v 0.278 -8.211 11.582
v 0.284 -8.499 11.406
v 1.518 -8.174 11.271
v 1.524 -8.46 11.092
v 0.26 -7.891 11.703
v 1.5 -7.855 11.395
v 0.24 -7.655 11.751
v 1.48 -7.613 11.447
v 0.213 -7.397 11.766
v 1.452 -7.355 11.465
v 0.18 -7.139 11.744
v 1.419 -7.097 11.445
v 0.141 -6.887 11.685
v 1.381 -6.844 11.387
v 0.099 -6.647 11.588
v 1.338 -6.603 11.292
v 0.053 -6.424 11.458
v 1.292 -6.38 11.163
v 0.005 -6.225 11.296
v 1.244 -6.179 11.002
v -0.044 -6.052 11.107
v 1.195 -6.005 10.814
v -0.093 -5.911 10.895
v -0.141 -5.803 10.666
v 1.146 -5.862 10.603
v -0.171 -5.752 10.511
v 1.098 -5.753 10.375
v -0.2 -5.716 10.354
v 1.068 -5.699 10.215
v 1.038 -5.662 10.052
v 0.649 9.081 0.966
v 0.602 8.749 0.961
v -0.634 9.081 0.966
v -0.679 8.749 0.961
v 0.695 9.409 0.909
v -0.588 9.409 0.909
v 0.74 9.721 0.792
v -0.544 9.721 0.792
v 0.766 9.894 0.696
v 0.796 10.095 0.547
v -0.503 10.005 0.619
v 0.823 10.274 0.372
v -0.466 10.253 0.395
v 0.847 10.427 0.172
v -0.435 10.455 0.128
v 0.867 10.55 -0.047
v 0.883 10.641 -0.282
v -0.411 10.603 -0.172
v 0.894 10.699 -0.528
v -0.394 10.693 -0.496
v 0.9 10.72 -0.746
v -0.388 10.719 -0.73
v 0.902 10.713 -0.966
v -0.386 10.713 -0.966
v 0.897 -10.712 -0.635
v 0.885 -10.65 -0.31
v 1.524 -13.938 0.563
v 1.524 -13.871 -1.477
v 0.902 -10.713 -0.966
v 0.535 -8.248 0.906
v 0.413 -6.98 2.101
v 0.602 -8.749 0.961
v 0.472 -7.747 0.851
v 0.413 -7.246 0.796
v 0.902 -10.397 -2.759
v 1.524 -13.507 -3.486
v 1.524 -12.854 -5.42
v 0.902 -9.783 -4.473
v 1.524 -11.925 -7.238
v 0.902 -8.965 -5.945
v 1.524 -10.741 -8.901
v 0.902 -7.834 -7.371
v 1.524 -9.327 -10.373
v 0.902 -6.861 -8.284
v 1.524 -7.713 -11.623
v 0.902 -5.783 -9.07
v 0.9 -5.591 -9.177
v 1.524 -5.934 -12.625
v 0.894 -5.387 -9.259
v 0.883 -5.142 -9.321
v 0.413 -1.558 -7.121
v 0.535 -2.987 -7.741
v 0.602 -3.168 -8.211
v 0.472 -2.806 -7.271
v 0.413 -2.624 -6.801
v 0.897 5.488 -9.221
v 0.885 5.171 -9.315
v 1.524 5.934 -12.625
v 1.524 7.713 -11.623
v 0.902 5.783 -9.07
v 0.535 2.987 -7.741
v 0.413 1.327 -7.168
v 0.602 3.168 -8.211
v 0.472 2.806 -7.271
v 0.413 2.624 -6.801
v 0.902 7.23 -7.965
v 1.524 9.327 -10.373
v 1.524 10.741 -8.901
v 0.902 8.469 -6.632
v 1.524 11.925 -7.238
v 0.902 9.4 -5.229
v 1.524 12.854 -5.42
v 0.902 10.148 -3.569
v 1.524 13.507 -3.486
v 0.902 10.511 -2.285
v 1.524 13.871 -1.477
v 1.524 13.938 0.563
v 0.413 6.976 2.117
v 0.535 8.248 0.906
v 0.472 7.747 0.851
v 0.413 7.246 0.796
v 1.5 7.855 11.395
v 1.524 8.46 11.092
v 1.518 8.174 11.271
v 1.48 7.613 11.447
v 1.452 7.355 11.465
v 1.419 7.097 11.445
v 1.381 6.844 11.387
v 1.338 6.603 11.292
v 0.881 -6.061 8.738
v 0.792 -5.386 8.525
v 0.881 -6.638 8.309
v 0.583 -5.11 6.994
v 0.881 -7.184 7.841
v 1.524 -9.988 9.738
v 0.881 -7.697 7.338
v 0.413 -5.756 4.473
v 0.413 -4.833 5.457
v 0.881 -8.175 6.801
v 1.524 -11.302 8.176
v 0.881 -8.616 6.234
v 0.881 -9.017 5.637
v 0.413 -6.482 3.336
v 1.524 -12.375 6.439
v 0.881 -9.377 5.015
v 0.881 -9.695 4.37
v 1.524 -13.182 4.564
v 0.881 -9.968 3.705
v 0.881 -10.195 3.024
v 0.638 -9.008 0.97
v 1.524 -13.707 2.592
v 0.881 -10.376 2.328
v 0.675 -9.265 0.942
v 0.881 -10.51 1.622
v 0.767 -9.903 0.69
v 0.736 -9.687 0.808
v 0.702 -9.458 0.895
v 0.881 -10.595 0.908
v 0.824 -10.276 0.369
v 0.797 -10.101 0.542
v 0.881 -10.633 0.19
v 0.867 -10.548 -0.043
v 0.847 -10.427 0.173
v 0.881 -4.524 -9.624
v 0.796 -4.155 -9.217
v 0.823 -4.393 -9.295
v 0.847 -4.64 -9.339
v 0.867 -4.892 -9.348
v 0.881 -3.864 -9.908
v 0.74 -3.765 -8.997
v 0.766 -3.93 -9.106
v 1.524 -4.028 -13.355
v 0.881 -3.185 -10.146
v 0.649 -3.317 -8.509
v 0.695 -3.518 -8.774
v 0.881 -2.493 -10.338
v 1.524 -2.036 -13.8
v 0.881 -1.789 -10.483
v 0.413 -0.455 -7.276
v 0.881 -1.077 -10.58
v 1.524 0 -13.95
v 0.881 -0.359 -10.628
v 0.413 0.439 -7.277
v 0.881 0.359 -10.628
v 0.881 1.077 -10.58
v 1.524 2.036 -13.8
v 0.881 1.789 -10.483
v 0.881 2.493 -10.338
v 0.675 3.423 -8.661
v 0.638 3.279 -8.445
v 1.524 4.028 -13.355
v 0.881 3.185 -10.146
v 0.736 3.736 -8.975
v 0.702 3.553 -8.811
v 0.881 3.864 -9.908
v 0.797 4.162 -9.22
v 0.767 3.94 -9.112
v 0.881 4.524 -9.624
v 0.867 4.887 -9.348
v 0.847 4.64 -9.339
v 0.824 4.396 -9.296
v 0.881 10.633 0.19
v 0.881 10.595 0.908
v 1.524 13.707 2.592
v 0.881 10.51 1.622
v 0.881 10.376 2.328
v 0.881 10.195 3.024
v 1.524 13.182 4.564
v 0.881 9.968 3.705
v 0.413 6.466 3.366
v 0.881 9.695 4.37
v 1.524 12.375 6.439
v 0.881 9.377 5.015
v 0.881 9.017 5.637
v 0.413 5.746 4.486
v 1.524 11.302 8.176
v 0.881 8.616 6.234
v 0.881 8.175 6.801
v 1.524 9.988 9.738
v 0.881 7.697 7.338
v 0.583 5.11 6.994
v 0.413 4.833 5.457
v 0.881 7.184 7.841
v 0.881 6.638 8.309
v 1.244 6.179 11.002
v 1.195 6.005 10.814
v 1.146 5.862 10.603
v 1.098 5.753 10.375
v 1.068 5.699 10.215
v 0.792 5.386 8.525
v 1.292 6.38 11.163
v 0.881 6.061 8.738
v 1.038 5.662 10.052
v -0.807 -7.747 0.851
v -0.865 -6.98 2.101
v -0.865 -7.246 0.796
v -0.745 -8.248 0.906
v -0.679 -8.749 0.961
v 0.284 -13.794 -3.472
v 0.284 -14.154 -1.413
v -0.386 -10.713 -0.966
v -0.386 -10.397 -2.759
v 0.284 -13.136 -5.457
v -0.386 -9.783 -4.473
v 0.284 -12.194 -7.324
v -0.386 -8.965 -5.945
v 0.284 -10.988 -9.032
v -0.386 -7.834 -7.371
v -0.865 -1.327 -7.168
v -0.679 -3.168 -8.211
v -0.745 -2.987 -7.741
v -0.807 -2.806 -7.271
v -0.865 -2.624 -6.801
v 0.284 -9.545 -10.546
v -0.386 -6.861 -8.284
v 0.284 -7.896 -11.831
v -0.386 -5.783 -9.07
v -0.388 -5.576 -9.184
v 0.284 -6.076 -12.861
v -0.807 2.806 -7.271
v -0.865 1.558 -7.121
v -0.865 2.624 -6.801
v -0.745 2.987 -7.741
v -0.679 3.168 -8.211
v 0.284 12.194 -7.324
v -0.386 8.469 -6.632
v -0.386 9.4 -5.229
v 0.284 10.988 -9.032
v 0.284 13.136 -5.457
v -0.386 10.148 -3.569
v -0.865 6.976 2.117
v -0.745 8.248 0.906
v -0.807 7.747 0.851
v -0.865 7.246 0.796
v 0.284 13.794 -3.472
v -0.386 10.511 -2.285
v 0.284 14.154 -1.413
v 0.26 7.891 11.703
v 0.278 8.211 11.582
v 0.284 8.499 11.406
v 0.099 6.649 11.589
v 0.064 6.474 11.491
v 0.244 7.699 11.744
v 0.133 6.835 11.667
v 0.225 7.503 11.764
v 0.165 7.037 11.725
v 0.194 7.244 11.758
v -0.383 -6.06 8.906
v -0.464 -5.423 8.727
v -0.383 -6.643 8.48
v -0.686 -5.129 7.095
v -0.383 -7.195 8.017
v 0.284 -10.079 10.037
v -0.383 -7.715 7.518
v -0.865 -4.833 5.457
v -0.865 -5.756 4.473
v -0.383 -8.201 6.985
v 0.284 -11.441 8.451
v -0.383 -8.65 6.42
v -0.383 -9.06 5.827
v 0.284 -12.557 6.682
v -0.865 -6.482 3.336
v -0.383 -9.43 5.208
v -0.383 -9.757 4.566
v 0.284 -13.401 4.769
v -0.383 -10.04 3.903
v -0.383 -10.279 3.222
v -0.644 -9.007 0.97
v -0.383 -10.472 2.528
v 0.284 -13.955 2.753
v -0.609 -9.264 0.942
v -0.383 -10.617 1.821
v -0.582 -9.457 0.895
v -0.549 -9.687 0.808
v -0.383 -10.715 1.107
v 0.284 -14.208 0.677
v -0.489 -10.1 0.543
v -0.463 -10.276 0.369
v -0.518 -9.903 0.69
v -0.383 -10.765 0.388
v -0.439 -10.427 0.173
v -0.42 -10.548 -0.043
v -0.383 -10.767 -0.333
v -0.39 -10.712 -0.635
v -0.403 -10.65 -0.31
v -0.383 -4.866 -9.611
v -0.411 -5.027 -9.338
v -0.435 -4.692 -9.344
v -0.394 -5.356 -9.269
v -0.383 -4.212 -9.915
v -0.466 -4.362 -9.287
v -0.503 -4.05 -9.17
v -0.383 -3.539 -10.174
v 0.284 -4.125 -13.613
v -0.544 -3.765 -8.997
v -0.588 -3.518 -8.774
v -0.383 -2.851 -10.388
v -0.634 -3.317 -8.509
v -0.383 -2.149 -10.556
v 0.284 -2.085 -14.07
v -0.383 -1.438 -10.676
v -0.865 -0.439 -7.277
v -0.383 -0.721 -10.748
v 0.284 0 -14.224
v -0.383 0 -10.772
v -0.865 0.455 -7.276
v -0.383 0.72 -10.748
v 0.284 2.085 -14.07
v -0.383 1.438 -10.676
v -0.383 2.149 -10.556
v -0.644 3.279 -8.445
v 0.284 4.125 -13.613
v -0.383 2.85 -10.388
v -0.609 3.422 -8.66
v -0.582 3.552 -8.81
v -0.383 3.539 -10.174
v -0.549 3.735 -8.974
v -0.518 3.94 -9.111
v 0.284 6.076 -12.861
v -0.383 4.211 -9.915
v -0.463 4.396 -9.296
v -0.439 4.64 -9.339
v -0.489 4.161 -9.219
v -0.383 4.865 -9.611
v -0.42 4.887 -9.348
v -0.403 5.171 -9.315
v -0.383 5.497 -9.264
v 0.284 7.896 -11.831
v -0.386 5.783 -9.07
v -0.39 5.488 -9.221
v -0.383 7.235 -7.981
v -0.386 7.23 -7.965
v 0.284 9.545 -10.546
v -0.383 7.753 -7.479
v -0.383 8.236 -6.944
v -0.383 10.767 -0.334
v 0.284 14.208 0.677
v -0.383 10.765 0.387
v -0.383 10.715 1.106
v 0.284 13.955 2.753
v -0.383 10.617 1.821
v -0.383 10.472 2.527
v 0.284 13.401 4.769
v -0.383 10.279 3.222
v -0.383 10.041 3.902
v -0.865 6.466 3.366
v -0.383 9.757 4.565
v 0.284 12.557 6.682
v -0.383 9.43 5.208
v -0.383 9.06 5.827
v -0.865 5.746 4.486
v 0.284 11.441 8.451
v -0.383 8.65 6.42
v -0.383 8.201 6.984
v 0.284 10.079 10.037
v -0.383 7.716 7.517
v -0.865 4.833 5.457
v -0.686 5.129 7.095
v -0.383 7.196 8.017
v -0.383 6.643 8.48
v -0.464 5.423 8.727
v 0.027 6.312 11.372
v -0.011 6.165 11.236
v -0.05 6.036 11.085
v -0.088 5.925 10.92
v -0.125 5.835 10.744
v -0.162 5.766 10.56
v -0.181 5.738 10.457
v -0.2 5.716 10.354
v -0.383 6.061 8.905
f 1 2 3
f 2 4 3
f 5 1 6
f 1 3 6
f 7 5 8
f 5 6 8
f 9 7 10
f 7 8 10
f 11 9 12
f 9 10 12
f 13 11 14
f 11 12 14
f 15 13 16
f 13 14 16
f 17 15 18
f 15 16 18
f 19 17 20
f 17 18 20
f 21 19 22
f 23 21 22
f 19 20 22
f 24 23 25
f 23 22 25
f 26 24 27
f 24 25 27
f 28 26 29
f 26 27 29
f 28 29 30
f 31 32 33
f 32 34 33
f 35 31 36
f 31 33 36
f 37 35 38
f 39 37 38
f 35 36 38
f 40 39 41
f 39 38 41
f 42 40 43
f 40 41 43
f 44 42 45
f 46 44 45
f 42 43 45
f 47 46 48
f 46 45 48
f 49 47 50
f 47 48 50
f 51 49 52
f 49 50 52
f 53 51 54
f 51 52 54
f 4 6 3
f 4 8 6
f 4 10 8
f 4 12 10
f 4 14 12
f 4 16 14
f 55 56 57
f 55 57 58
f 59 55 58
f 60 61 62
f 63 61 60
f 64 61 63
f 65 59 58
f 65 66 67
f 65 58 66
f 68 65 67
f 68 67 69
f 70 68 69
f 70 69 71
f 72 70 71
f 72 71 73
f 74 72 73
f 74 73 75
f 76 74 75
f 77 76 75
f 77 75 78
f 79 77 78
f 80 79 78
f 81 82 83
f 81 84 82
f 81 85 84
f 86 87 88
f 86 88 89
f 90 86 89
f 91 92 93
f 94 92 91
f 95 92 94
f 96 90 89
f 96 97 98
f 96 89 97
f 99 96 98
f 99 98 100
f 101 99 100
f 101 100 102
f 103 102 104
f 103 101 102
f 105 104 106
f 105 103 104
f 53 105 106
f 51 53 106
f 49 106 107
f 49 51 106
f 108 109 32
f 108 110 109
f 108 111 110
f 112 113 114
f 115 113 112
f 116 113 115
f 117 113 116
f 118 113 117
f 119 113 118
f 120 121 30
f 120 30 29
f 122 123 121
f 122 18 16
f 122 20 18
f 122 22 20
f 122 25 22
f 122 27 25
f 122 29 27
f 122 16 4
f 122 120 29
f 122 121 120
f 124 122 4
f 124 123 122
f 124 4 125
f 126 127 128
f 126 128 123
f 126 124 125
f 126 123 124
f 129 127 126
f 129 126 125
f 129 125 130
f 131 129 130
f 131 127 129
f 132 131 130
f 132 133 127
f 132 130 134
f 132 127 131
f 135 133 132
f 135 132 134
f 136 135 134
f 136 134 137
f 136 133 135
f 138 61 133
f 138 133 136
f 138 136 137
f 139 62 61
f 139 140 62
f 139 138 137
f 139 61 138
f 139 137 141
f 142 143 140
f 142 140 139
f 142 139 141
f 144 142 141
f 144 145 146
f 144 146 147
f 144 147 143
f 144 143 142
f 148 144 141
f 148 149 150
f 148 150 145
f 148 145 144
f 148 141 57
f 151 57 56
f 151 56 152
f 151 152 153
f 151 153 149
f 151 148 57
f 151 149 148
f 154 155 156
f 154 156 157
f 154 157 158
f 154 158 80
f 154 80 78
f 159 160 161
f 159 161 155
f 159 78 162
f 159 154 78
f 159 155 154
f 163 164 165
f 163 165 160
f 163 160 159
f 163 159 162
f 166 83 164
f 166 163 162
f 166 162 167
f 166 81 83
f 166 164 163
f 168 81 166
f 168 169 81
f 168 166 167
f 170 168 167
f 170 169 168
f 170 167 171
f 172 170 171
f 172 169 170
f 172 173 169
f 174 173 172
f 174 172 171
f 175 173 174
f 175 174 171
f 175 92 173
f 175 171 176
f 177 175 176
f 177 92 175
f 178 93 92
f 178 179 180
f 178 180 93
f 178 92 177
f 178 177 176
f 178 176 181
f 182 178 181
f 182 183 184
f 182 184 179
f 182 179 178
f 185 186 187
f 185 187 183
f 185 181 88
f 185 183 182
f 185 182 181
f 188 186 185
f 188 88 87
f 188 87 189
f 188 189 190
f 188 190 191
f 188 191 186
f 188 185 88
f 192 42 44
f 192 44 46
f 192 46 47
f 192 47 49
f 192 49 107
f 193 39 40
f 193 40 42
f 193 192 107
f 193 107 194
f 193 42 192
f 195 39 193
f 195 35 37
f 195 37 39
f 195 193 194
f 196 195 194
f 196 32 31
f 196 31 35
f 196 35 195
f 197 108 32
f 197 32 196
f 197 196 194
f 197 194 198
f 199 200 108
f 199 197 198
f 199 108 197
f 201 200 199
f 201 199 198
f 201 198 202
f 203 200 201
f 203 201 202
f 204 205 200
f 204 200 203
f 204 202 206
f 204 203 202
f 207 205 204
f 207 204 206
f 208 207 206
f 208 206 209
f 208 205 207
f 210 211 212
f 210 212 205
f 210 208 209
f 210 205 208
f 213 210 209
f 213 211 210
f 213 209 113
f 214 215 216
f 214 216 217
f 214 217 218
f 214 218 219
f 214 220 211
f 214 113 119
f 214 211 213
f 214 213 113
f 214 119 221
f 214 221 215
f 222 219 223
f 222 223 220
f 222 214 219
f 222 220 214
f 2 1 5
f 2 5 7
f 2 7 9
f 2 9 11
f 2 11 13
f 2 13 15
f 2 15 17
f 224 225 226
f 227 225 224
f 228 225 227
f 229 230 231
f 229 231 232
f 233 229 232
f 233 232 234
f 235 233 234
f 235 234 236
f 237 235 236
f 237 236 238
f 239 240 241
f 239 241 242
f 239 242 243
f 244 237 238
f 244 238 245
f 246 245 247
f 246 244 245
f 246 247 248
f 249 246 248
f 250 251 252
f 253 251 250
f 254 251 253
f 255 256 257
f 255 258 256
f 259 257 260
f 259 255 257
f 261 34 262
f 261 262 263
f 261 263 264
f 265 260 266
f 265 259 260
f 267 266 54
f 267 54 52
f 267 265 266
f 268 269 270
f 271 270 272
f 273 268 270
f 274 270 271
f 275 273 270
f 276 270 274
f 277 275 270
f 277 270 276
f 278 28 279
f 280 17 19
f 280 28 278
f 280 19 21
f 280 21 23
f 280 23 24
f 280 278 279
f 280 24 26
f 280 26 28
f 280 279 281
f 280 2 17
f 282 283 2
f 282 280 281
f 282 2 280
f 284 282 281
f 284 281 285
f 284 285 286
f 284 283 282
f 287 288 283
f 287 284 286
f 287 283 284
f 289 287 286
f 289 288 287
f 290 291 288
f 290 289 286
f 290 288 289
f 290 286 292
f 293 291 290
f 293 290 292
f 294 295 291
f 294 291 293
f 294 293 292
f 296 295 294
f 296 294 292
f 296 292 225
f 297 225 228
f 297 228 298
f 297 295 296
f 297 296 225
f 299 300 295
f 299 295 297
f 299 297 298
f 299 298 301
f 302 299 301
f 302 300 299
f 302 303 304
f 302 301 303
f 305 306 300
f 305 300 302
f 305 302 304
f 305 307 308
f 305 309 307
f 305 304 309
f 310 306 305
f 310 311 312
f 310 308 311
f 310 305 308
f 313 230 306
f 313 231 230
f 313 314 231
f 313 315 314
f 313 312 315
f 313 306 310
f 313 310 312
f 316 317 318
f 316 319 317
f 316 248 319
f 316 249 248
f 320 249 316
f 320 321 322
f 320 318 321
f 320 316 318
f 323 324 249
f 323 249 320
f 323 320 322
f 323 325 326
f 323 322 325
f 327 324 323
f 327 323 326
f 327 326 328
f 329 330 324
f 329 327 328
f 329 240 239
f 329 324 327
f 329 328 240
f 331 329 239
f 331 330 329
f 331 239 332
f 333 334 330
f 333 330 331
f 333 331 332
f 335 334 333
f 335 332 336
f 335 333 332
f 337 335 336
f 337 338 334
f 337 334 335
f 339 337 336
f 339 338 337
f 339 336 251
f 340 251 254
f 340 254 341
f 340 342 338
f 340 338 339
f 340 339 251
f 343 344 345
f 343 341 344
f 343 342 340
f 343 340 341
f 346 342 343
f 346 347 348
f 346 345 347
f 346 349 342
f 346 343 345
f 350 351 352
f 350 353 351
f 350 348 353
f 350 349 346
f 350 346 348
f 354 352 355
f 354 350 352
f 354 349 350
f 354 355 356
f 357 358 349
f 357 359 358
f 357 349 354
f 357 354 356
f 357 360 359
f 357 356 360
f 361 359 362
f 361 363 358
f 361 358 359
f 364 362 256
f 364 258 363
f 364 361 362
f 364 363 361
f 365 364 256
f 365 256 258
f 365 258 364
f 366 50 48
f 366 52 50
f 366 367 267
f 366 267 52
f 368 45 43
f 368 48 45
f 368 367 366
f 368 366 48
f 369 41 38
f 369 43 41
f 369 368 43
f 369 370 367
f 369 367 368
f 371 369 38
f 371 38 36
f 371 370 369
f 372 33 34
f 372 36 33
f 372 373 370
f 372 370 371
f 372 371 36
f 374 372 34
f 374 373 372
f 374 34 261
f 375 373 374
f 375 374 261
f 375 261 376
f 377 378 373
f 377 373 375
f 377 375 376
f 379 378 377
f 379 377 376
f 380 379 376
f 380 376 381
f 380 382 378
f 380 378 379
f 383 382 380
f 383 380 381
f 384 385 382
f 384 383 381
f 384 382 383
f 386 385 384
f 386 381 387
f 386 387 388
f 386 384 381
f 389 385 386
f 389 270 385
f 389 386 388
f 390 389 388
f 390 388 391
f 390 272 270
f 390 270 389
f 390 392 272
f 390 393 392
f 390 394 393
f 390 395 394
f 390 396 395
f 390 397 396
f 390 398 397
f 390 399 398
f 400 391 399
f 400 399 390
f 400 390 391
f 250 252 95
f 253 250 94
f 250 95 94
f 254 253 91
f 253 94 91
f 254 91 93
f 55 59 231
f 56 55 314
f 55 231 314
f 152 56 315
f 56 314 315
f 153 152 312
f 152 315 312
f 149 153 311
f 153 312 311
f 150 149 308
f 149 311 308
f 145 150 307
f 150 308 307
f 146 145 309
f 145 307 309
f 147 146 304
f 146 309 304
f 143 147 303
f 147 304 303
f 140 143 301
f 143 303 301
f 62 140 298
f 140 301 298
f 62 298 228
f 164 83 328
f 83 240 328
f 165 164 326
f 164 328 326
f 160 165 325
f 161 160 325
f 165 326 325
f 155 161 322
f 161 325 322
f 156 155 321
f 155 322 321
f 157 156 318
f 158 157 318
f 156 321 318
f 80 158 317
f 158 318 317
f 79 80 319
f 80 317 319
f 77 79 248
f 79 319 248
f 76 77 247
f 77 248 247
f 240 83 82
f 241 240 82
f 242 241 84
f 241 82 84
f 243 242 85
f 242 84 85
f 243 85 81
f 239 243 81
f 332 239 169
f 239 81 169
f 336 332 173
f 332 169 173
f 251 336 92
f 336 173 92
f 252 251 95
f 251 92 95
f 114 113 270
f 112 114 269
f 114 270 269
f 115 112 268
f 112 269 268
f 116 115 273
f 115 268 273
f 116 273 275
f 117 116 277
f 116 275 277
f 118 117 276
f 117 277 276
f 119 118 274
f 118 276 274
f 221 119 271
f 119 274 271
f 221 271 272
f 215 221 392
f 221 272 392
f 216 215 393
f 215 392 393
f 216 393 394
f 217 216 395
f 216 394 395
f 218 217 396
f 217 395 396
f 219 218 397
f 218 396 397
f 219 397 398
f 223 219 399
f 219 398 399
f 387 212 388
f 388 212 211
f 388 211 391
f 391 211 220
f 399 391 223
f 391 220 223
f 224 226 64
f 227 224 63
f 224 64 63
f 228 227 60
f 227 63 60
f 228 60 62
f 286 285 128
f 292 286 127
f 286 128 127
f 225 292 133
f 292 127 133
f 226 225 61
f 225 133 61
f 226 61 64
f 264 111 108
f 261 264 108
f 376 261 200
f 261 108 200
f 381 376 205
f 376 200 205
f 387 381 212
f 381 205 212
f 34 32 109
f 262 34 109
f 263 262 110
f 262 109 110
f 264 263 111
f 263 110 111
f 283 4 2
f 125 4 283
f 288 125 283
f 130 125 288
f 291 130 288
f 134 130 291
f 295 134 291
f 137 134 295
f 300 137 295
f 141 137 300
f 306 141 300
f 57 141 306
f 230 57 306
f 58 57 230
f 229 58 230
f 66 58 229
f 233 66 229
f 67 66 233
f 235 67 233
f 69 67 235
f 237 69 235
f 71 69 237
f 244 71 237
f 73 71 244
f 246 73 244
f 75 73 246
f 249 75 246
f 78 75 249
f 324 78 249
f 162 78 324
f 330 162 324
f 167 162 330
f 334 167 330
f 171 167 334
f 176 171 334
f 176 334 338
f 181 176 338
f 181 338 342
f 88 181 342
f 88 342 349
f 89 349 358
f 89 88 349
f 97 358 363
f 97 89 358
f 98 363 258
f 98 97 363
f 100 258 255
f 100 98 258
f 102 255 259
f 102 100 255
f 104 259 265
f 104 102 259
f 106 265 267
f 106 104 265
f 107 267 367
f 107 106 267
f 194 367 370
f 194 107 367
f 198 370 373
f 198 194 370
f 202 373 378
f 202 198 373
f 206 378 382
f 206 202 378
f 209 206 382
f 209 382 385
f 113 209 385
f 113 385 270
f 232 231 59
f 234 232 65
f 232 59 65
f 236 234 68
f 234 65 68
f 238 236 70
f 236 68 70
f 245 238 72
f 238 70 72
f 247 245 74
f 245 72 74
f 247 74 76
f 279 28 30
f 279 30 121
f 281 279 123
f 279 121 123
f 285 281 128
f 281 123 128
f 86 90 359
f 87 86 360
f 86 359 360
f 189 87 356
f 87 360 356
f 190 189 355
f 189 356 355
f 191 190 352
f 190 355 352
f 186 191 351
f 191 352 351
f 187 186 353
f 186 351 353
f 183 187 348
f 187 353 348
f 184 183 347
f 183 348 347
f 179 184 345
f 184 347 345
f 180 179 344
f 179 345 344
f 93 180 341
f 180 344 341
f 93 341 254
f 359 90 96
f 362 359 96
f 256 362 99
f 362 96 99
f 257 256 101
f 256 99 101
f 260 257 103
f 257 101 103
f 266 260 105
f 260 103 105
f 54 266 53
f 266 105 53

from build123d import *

# Parameters (mm, degrees)
CUT_EXTRUDE1_DEPTH = 3.794
FILLET1_R          = 1.778


with BuildPart() as part:
    # Sketch2 → Revolve1 (revolve)
    with BuildSketch(Plane(origin=(0, 0, 0), x_dir=(1, 0, 0), z_dir=(0, 1, 0))):
        with BuildLine():
            Line((0.283958229, 14.224), (1.524, 13.949780367))
            ThreePointArc((1.524, 13.949780367), (0.382130108, 7.016390601), (0, 0))
            Line((0, 0), (-1.27, 0))
            ThreePointArc((-1.27, 0), (-0.880358119, 7.154316218), (0.283958229, 14.224))
        make_face()
    revolve(axis=Axis((0, 0, 0), (1, 0, 0)))

    # Sketch1 → Cut-Extrude1 (cut, through all)
    with BuildSketch(Plane(origin=(1.524, 0, 0), x_dir=(0, 0, -1), z_dir=(1, 0, 0))):
        with BuildLine():
            Line((-12.820693103, -6.160519812), (-5.457008659, -4.833450169))
            ThreePointArc((-5.457008659, -4.833450169), (-3.351086736, -6.473901585), (-0.795799518, -7.246232619))
            Line((-0.795799518, -7.246232619), (-1.174289533, -10.692611547))
            ThreePointArc((-1.174289533, -10.692611547), (5.59102597, -9.189740269), (10.03567463, -3.872484))
            Line((10.03567463, -3.872484), (6.8010357, -2.624328))
            ThreePointArc((6.8010357, -2.624328), (7.2898, 0), (6.8010357, 2.624328))
            Line((6.8010357, 2.624328), (10.03567463, 3.872484))
            ThreePointArc((10.03567463, 3.872484), (5.59102597, 9.189740269), (-1.174289533, 10.692611547))
            Line((-1.174289533, 10.692611547), (-0.795799518, 7.246232619))
            ThreePointArc((-0.795799518, 7.246232619), (-3.351086736, 6.473901585), (-5.457008659, 4.833450169))
            Line((-5.457008659, 4.833450169), (-12.820693103, 6.160519812))
            ThreePointArc((-12.820693103, 6.160519812), (-14.224, 0), (-12.820693103, -6.160519812))
        make_face()
    extrude(amount=-CUT_EXTRUDE1_DEPTH, mode=Mode.SUBTRACT)

    # Fillet1
    fillet1_edges = [part.edges().sort_by_distance(p)[0] for p in [
        (0.257994341, 10.692611547, 1.174289533),
        (0.257994341, 3.872484, -10.03567463),
        (0.257994341, -3.872484, -10.03567463),
        (0.257994341, -10.692611547, 1.174289533),
        (0.9039909, -6.135280444, 12.680644128),
        (0.9039909, 6.135280444, 12.680644128),
    ]]
    fillet(fillet1_edges, radius=FILLET1_R)


solid = part.part
